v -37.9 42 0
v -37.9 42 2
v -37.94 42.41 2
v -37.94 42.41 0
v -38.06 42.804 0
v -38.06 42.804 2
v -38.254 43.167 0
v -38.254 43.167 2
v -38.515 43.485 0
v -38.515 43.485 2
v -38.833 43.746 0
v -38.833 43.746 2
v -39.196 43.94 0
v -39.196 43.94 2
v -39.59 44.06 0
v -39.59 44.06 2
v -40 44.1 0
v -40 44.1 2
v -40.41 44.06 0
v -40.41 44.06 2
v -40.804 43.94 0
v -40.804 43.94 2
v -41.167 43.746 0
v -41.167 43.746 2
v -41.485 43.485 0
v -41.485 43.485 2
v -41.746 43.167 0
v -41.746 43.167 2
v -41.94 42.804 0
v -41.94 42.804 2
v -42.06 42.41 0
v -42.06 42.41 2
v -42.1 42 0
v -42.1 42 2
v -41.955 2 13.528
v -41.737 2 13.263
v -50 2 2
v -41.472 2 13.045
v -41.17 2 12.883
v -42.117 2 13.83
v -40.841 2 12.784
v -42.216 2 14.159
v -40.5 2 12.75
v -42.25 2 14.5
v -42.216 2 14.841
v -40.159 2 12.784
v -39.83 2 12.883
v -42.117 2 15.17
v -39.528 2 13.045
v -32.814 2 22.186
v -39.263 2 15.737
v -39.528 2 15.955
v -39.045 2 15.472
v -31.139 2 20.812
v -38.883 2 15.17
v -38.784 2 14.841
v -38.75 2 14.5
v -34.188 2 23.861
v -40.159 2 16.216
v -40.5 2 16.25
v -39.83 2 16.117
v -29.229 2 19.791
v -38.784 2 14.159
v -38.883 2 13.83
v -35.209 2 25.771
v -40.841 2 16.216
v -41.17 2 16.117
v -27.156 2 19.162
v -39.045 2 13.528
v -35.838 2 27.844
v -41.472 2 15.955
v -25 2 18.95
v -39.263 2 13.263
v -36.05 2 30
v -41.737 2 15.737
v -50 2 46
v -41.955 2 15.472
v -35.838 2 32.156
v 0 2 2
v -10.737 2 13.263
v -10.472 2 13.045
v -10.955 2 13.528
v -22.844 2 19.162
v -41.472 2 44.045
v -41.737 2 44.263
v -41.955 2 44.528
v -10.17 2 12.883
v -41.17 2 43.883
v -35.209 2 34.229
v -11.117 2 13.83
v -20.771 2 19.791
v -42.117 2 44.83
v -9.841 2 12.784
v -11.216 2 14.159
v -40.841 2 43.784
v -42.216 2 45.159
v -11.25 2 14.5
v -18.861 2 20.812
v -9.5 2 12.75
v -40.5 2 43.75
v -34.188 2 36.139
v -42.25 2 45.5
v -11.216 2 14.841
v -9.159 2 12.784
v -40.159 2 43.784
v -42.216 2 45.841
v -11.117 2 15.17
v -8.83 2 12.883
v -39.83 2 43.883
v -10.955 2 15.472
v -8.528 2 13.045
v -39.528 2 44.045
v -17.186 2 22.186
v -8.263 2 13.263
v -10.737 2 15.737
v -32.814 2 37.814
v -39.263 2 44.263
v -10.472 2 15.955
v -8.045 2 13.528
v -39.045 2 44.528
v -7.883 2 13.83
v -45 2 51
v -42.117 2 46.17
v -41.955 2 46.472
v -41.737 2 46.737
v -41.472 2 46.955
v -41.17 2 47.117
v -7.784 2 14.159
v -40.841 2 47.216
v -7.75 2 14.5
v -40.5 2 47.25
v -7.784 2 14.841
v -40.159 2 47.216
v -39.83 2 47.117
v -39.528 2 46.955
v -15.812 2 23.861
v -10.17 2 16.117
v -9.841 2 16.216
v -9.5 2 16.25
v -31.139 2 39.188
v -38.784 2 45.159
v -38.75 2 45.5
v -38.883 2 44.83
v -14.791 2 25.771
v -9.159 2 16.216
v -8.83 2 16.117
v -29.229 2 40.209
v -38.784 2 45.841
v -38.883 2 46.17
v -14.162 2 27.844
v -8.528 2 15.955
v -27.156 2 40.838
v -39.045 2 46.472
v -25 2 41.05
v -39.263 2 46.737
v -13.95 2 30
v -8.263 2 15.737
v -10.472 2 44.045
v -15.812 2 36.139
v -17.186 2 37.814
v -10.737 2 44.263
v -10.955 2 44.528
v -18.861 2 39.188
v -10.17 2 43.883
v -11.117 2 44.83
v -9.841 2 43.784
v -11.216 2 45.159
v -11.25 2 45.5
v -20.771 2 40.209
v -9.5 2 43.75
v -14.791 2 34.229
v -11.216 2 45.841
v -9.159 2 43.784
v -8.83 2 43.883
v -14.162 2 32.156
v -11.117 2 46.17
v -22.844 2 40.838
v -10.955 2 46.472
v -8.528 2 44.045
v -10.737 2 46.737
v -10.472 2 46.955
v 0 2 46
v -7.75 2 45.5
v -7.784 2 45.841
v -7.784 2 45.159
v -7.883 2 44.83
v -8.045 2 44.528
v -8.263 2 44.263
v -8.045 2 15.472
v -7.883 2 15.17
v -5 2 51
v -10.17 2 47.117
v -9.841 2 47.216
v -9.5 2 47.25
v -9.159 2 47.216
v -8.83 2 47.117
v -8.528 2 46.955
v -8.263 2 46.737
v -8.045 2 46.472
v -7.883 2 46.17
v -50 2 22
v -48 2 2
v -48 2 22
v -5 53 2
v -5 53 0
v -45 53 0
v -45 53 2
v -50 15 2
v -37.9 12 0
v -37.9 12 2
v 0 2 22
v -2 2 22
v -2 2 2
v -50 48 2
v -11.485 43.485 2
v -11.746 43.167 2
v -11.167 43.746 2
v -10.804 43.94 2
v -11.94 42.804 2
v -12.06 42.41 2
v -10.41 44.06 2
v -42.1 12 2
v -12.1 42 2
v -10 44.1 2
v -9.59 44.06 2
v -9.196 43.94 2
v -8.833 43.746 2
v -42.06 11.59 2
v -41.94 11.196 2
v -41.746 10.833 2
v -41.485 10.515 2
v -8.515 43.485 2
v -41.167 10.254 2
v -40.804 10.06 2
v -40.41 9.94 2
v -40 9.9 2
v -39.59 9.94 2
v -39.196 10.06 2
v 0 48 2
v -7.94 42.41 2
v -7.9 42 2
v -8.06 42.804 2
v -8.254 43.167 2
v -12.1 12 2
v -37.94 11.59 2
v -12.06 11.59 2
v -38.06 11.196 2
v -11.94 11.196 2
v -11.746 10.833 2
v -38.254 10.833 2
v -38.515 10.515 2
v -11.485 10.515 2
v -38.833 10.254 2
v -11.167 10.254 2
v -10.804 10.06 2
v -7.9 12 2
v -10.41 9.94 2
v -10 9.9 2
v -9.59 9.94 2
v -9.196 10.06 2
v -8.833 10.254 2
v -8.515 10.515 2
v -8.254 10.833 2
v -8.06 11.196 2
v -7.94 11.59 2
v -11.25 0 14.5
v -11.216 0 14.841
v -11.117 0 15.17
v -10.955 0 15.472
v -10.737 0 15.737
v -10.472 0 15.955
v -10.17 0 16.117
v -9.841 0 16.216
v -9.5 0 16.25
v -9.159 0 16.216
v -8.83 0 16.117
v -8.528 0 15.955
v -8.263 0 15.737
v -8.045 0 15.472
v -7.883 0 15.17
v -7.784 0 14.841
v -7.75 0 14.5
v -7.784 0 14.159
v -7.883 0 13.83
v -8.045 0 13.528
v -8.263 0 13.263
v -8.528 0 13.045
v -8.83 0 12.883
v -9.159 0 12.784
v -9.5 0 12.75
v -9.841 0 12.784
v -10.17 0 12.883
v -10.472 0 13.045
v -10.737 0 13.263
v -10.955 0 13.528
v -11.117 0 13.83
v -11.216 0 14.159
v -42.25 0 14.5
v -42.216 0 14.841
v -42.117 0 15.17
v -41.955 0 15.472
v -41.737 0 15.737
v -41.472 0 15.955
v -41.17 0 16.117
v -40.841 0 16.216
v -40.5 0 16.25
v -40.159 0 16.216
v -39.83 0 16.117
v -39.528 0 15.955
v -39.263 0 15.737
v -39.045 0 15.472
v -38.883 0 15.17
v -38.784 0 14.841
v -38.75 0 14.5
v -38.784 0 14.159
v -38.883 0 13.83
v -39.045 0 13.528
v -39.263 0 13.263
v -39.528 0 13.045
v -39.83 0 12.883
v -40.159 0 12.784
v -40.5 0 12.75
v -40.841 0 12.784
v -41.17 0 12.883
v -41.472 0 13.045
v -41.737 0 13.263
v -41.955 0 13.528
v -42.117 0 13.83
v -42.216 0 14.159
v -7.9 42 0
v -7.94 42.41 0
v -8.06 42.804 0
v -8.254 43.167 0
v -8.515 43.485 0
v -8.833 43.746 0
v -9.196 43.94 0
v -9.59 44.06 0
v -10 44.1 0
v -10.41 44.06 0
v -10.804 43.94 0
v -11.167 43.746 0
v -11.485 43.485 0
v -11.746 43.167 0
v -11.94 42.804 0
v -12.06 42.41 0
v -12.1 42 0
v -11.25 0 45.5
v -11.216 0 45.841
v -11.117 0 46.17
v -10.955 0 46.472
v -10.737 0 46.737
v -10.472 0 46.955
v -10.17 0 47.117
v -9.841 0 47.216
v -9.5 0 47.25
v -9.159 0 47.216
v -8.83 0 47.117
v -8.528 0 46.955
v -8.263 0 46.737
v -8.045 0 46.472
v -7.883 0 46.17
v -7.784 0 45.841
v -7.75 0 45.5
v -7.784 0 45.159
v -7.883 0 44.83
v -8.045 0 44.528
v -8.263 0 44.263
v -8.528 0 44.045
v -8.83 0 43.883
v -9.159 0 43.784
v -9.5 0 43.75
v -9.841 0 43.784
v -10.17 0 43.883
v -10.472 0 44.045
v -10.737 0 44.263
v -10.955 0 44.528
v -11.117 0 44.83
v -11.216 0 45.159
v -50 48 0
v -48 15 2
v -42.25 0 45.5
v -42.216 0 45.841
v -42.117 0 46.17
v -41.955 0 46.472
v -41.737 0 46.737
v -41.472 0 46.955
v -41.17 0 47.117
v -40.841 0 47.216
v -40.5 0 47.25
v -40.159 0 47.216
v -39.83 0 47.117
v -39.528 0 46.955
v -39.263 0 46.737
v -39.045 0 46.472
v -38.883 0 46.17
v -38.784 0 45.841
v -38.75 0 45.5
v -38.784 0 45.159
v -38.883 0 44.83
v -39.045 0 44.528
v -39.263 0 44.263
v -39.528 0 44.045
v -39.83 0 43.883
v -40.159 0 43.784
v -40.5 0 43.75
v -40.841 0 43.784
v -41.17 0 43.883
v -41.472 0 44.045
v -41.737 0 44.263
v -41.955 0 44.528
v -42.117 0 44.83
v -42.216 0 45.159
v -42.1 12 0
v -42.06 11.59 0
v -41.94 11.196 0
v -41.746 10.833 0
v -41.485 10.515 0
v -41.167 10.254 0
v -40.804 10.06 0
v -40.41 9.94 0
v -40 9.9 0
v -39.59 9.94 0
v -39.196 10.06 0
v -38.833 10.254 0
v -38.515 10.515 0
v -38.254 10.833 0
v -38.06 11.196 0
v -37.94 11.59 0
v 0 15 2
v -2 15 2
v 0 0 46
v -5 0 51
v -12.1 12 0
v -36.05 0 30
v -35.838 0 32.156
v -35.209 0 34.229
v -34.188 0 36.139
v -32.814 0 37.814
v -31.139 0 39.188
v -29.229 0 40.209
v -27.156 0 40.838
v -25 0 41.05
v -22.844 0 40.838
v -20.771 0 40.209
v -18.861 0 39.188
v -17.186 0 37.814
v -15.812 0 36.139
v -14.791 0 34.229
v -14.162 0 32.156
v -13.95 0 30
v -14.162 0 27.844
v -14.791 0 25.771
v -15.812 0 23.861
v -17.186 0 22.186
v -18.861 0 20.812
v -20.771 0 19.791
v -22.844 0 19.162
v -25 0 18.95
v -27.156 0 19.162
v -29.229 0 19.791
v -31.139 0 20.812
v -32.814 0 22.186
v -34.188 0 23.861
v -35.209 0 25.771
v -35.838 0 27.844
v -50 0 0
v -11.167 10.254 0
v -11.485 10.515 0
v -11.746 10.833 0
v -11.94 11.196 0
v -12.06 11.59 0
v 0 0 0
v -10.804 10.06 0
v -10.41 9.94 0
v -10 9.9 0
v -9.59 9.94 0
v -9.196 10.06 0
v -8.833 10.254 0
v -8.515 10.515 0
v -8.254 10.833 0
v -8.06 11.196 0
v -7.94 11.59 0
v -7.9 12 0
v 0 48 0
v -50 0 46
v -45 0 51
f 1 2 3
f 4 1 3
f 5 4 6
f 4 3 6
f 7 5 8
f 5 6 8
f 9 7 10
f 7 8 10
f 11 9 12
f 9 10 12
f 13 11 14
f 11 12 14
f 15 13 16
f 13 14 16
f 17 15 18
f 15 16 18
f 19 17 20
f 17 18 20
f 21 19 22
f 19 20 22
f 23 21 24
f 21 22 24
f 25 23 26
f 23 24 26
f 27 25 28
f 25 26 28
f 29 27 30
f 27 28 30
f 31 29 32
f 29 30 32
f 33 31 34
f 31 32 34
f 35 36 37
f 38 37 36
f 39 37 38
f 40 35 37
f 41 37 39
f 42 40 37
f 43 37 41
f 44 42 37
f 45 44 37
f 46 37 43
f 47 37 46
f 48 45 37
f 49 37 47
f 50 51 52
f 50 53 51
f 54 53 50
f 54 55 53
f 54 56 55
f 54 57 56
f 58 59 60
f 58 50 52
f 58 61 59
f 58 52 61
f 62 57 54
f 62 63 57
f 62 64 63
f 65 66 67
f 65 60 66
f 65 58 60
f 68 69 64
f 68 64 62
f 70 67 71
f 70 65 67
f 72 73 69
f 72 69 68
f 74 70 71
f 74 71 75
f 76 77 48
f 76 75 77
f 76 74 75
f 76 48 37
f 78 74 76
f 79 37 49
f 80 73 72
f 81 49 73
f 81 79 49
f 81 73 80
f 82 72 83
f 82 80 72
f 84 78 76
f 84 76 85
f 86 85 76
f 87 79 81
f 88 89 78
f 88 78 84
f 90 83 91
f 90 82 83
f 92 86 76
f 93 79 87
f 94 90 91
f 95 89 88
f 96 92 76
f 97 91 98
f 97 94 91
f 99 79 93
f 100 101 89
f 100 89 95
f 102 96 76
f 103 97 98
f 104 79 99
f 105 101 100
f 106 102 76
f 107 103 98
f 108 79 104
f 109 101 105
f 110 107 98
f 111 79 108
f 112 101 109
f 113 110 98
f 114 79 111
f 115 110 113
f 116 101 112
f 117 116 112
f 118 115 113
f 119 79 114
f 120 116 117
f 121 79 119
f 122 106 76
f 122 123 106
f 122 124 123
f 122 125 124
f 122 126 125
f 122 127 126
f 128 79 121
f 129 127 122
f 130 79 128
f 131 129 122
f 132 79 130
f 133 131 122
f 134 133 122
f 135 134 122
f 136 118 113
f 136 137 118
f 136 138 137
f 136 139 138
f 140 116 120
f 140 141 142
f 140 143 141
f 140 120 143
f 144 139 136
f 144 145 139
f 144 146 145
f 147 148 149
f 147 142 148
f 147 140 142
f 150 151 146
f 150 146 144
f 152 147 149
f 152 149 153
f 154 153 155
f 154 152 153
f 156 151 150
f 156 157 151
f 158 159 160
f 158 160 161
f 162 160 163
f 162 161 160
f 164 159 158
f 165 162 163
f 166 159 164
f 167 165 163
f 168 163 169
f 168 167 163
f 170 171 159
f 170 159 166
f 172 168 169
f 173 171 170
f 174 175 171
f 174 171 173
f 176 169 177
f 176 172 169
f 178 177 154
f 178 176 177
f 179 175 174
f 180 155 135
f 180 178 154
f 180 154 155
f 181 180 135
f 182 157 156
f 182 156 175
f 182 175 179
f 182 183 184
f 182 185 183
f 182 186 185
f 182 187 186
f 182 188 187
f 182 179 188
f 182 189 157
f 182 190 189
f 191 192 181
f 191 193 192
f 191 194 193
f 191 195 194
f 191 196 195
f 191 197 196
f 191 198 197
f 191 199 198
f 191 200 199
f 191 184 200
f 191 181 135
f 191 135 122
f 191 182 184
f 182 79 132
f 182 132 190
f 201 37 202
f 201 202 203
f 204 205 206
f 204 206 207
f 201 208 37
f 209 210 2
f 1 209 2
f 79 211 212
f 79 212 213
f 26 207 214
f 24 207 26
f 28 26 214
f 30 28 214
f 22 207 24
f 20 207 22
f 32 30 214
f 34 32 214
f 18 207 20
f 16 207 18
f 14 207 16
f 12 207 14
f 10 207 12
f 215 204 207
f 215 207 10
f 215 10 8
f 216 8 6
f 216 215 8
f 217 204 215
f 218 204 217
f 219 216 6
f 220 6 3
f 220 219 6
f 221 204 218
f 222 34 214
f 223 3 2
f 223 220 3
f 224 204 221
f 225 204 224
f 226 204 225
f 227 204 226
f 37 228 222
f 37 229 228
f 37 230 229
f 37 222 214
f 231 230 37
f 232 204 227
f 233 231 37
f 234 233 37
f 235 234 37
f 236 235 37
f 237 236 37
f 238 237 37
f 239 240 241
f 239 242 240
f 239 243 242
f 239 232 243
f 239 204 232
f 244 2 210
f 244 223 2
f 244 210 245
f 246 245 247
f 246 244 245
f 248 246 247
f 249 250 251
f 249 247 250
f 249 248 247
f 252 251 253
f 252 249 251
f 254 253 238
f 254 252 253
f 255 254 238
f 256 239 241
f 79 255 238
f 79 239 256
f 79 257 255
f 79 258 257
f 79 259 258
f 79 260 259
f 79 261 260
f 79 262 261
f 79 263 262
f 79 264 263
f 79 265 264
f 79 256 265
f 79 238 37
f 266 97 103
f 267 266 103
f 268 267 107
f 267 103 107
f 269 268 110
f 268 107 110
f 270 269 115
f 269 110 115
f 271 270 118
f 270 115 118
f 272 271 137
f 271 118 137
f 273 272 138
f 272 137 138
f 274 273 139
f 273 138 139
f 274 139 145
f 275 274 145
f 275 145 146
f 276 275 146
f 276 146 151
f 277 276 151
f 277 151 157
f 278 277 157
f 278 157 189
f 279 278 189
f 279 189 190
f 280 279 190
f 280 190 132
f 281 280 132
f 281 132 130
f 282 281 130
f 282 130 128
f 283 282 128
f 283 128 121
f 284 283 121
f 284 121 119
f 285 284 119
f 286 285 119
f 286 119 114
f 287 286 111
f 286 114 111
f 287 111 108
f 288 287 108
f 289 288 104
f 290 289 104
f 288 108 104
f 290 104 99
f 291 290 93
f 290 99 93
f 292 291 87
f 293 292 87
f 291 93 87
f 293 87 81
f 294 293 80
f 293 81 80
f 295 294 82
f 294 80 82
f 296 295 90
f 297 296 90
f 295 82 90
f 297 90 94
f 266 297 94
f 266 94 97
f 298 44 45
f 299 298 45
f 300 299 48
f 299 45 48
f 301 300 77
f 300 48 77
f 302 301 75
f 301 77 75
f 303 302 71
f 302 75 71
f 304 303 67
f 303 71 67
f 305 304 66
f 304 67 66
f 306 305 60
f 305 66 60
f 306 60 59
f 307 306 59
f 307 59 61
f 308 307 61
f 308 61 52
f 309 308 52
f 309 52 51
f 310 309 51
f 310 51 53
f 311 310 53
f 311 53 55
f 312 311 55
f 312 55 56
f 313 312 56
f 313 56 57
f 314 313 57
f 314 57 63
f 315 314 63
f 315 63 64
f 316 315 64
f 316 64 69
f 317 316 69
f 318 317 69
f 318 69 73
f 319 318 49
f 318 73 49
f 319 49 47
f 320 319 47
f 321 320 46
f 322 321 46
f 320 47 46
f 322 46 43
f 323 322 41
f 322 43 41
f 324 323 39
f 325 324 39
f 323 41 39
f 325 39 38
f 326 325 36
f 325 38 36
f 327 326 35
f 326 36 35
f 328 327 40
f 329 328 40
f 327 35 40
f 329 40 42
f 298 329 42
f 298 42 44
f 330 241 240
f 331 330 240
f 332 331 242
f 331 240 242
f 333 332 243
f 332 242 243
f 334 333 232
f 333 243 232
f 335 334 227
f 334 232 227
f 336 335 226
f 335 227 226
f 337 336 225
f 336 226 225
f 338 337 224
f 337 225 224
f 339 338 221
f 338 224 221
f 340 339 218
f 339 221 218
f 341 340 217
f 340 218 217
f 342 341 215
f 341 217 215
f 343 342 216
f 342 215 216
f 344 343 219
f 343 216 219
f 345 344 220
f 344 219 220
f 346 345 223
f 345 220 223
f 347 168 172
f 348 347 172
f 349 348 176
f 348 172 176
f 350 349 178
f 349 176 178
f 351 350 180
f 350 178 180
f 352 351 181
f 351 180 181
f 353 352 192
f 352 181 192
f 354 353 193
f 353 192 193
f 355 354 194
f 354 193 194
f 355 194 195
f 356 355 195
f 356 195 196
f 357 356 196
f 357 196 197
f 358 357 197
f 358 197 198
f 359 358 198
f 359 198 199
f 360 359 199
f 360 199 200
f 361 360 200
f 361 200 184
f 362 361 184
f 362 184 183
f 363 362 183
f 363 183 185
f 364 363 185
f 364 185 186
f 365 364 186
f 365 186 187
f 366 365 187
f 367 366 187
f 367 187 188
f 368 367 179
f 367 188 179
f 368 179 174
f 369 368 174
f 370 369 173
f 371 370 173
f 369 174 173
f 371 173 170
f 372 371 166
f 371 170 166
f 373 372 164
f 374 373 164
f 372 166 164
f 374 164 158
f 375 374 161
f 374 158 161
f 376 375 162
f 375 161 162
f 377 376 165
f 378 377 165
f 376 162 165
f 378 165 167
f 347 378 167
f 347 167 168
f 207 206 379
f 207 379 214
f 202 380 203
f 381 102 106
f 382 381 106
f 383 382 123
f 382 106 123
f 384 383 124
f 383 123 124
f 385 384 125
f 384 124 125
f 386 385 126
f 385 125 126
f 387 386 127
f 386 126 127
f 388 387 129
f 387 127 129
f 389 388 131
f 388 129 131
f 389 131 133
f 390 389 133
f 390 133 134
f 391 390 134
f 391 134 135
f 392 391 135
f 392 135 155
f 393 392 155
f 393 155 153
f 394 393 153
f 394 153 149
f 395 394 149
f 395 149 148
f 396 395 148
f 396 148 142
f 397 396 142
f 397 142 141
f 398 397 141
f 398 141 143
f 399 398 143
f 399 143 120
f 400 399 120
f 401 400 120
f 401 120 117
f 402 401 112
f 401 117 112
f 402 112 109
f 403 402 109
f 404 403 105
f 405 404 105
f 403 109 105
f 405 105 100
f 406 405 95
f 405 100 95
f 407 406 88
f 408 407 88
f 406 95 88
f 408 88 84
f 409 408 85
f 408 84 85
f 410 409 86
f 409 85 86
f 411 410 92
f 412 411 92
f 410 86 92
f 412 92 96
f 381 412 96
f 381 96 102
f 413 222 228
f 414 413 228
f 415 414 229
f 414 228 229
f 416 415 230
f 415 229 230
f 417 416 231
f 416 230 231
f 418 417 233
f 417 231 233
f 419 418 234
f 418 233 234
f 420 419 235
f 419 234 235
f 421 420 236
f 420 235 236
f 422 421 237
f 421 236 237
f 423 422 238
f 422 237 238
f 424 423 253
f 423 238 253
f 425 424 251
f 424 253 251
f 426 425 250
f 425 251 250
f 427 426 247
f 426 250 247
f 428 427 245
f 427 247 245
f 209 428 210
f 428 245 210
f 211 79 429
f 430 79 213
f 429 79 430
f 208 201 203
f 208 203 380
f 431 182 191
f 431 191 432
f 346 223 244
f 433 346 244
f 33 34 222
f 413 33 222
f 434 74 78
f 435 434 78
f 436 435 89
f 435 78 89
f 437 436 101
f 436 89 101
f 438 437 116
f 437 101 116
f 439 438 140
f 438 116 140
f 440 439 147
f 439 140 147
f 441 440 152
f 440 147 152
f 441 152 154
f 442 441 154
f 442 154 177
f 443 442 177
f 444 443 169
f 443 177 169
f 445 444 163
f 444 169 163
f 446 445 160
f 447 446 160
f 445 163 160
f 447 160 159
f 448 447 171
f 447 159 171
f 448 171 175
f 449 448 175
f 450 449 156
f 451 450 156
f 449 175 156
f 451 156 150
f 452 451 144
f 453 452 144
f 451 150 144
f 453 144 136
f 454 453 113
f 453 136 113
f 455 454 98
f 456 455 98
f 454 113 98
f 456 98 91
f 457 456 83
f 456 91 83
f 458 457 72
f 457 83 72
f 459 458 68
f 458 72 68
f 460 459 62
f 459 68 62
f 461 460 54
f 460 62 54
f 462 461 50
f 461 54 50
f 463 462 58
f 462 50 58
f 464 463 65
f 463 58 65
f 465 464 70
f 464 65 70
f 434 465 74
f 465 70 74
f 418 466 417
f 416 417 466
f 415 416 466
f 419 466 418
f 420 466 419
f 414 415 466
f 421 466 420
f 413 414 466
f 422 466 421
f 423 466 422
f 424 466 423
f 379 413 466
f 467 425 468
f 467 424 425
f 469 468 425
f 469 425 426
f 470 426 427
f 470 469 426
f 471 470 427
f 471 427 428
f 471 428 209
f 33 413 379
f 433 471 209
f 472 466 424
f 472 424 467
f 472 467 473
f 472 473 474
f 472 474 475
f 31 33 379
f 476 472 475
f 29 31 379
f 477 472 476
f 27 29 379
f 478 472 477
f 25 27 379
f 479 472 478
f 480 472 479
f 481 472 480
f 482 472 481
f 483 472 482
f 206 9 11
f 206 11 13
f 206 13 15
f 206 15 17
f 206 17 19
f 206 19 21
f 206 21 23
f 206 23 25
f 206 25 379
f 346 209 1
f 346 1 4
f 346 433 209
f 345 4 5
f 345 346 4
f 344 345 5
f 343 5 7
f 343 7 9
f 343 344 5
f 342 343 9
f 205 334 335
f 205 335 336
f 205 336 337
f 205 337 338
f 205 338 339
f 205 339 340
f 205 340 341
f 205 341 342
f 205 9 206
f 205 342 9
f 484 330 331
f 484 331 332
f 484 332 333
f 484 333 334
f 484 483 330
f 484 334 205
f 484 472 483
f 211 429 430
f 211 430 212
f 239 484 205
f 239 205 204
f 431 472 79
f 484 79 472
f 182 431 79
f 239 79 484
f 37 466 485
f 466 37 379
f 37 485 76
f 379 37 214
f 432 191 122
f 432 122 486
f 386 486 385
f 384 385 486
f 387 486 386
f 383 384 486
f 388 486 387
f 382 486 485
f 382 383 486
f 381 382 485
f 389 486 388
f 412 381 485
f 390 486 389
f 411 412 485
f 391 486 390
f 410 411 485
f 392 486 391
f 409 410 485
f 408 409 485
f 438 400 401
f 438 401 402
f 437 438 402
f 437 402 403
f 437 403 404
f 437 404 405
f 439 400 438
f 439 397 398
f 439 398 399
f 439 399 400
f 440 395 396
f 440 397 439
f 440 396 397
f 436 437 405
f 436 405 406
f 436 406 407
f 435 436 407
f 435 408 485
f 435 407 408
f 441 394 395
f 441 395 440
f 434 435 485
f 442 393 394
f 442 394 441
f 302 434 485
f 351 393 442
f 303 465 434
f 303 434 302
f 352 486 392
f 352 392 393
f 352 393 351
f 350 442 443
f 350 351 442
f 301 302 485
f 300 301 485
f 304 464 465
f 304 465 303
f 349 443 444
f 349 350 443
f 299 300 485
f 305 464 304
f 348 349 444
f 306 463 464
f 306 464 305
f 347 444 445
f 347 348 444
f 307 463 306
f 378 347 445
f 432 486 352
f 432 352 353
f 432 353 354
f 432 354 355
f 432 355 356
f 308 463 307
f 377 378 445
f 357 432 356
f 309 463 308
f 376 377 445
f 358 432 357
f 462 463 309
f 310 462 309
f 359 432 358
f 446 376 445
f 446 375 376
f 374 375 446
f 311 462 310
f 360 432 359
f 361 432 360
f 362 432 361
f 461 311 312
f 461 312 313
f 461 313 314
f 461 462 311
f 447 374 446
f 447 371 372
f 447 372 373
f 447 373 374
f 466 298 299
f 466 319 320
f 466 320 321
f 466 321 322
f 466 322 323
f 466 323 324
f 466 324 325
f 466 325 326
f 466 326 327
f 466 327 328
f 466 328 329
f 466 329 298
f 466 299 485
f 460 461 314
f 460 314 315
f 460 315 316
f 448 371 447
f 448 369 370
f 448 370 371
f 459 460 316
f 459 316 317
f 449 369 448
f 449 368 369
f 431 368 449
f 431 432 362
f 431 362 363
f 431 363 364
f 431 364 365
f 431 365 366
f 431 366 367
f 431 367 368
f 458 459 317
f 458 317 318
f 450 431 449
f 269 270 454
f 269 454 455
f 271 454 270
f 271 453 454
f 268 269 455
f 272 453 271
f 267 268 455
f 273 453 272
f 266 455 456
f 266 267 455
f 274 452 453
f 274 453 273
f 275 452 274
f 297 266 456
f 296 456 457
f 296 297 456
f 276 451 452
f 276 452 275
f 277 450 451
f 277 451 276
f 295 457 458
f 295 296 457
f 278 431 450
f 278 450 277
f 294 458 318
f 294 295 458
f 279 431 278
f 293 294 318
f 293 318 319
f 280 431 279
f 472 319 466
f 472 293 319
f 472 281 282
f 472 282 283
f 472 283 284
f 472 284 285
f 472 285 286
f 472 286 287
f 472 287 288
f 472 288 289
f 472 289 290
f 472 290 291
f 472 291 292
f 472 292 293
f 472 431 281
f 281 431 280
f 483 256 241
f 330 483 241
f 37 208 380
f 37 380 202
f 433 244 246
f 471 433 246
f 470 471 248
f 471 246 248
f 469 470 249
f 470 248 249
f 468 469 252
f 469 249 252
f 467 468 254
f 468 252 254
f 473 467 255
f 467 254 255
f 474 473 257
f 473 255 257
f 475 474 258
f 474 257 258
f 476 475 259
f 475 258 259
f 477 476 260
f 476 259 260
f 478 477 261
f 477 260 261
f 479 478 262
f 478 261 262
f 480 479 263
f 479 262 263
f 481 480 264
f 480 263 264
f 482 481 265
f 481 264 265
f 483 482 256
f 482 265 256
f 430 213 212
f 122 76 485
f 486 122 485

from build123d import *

# Parameters (mm, degrees)
F1_DEPTH  = 50
F2_R      = 11.05
F3_DEPTH  = 2
F5_D      = 3.5
F6_SIZE   = 5
F8_DEPTH  = 2
F9_SIZE   = 5
F10_SIZE  = 5
F12_DEPTH = 2
F14_DEPTH = 2


with BuildPart() as f1:
    # F0 (on Right) → F1 (new body)
    with BuildSketch(Plane.YZ):
        Polygon((2, 51), (0, 51), (0, 0), (53, 0), (53, 2), (2, 2), align=None)
    extrude(amount=-F1_DEPTH)

    # F2 (on face) → F3 (cut)
    with BuildSketch(Plane(origin=(0, 2, 0), x_dir=(-1, 0, 0), z_dir=(0, 1, 0))):
        with Locations((25, 30)):
            Circle(F2_R)
    extrude(amount=-F3_DEPTH, mode=Mode.SUBTRACT)

    # F5 (through all)
    with Locations(Plane.XZ):
        with Locations((-9.5, 45.5), (-40.5, 45.5), (-40.5, 14.5), (-9.5, 14.5)):
            Hole(F5_D / 2)

    # F6
    f6_edges = [f1.edges().sort_by_distance(p)[0] for p in [
        (0, 1, 51),
        (-50, 1, 51),
    ]]
    chamfer(f6_edges, length=F6_SIZE)

    # F7 (on face) → F8 (cut, through all)
    with BuildSketch(Plane.XY.offset(2)):
        with BuildLine():
            Line((-12.1, 42), (-12.1, 12))
            ThreePointArc((-12.1, 12), (-10, 9.9), (-7.9, 12))
            Line((-7.9, 12), (-7.9, 42))
            ThreePointArc((-7.9, 42), (-10, 44.1), (-12.1, 42))
        make_face()
        with BuildLine():
            ThreePointArc((-37.9, 42), (-40, 44.1), (-42.1, 42))
            Line((-42.1, 42), (-42.1, 12))
            ThreePointArc((-42.1, 12), (-40, 9.9), (-37.9, 12))
            Line((-37.9, 12), (-37.9, 42))
        make_face()
    extrude(amount=-F8_DEPTH, mode=Mode.SUBTRACT)

    # F9
    f9_edges = [f1.edges().sort_by_distance(p)[0] for p in [
        (-50, 53, 1),
    ]]
    chamfer(f9_edges, length=F9_SIZE)

    # F10
    f10_edges = [f1.edges().sort_by_distance(p)[0] for p in [
        (0, 53, 1),
    ]]
    chamfer(f10_edges, length=F10_SIZE)


with BuildPart() as f12:
    # F11 (on face) → F12 (new body)
    with BuildSketch(Plane.YZ):
        Polygon((2, 22), (2, 2), (15, 2), align=None)
    extrude(amount=-F12_DEPTH)


with BuildPart() as f14:
    # F13 (on face) → F14 (new body)
    with BuildSketch(Plane(origin=(-50, 0, 0), x_dir=(0, -1, 0), z_dir=(-1, 0, 0))):
        Polygon((-15, 2), (-2, 2), (-2, 22), align=None)
    extrude(amount=-F14_DEPTH)


solid = Compound([f1.part, f12.part, f14.part])
